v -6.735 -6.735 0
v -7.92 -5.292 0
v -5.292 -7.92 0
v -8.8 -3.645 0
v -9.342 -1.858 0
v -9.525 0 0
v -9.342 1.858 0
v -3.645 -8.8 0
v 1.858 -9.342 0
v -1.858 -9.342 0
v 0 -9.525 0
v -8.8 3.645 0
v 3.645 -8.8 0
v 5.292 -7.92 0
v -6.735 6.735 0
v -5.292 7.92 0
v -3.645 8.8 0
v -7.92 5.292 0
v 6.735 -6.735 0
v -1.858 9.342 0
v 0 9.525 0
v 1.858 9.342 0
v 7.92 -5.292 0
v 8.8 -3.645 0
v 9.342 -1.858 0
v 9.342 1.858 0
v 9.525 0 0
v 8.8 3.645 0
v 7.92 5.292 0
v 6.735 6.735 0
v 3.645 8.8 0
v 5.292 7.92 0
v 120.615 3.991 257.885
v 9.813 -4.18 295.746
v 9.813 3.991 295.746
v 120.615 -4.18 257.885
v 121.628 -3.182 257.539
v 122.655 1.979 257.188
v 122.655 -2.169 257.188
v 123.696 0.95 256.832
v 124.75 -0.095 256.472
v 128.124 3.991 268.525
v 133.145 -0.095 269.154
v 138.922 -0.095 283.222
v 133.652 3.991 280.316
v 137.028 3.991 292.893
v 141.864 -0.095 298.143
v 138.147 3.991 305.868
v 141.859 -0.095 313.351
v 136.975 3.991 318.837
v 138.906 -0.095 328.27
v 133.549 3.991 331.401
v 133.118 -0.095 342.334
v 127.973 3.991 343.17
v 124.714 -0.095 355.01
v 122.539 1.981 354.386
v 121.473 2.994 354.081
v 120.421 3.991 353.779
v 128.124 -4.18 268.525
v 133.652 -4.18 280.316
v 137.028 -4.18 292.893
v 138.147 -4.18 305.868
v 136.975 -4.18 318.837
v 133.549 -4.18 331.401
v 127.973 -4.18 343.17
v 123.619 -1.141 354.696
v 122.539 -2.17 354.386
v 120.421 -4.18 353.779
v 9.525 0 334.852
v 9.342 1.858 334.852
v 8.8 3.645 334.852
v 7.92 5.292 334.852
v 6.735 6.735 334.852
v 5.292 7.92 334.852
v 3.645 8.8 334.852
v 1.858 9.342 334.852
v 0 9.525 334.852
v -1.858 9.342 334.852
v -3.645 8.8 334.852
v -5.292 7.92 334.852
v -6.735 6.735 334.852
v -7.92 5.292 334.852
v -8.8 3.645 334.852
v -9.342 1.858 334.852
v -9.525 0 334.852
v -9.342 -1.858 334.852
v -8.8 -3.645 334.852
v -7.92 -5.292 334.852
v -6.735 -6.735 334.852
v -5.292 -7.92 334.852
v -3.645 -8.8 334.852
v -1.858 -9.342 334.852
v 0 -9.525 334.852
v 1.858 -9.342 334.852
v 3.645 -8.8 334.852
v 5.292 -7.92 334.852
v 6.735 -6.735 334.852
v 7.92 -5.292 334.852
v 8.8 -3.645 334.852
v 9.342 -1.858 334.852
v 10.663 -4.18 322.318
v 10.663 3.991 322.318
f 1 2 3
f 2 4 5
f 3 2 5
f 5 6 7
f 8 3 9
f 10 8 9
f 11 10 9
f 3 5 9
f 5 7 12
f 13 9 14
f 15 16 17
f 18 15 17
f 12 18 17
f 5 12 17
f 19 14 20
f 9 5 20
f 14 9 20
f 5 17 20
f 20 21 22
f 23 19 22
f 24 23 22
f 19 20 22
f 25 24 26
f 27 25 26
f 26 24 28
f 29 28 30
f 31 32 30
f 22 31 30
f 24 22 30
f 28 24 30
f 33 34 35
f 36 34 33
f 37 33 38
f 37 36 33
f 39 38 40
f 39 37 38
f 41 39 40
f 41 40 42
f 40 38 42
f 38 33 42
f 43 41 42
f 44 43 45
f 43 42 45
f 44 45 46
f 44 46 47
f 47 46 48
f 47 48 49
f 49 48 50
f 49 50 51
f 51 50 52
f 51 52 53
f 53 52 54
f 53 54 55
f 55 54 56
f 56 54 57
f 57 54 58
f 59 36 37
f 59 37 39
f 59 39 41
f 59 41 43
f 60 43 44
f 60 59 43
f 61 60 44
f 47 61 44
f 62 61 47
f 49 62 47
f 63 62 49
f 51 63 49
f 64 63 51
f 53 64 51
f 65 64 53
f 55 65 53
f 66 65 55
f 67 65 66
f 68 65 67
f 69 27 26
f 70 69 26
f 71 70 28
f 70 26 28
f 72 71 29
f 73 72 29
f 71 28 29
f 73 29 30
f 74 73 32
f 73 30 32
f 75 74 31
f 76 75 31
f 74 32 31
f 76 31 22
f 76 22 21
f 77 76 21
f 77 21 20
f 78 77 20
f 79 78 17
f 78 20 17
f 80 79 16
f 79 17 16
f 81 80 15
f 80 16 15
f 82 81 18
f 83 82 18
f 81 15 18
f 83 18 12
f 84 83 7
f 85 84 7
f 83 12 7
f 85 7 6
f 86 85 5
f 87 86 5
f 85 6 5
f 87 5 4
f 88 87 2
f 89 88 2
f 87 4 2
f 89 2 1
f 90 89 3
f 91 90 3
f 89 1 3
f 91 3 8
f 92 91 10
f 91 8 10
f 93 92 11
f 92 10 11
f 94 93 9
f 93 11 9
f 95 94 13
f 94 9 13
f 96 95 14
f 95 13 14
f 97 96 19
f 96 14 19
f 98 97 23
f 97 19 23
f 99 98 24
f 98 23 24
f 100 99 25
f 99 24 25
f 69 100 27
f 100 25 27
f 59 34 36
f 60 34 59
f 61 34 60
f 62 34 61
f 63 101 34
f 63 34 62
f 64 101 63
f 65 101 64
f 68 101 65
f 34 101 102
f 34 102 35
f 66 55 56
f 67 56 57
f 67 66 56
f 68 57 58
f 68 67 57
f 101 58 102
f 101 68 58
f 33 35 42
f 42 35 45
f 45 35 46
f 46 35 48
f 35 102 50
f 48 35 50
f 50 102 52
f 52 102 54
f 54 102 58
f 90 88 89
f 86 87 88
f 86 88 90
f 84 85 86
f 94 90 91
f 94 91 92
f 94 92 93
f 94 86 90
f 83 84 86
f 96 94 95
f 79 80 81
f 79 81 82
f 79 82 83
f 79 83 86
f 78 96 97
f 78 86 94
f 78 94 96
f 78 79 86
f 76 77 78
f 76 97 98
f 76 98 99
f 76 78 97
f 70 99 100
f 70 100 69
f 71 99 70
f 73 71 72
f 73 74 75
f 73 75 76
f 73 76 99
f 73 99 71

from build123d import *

# Parameters (mm, degrees)
F0_R          = 9.525
F1_DEPTH      = 334.85178
F3_DEPTH      = 4.18014
F3_DEPTH_BACK = 3.99072
F4_T2_ANGLE   = 96.5800048024
F4_T4_ANGLE   = 96.5800048024


# Not quite as in the source:
# - a fillet or chamfer that OpenCascade refuses, or shapes differently, is made with other operations: its cross-section is extruded or revolved along the edge and cut away or added


with BuildPart() as f1:
    # F0 (on Top) → F1 (new body)
    with BuildSketch(Plane.XY):
        Circle(F0_R)
    extrude(amount=F1_DEPTH)


with BuildPart() as f3:
    # F2 (on Front) → F3 (new body, two sides)
    with BuildSketch(Plane.XZ) as f3_sk:
        with BuildLine():
            Line((125.7524490356, 355.3073406219), (10.6634572148, 322.3180174828))
            Line((10.6634572148, 322.3180174828), (9.8127294332, 295.7464158535))
            Line((9.8127294332, 295.7464158535), (125.7524490356, 256.1295628548))
            ThreePointArc((125.7524490356, 256.1295628548), (143.2271122484, 305.7184517384), (125.7524490356, 355.3073406219))
        make_face()
    extrude(amount=F3_DEPTH)
    extrude(f3_sk.sketch, amount=-F3_DEPTH_BACK)

    # F4: chamfer of 5.08 on 2 edges, made by hand

    # F4_s1 → F4_t2 (revolve, cut)
    with BuildSketch(Plane(origin=(187.5911639165, 0, 167.1963566243), x_dir=(0, 1, 0), z_dir=(-0.7465220942, 0, -0.6653606262))):
        Polygon((0.89986, -106.4585931816), (-4.18014, -111.5385931816), (-4.18014, -106.4585931816), align=None)
    revolve(axis=Axis((64.129114151, -4.18014, 305.7184517384), (0, -1, 0)), revolution_arc=F4_T2_ANGLE, mode=Mode.SUBTRACT)

    # F4_s3 → F4_t4 (revolve, cut)
    with BuildSketch(Plane(origin=(187.5911639165, 0, 167.1963566243), x_dir=(0, 1, 0), z_dir=(-0.7465220942, 0, -0.6653606262))):
        Polygon((-1.08928, -106.4585931816), (3.99072, -111.5385931816), (3.99072, -106.4585931816), align=None)
    revolve(axis=Axis((64.129114151, 3.99072, 305.7184517384), (0, -1, 0)), revolution_arc=F4_T4_ANGLE, mode=Mode.SUBTRACT)


solid = Compound([f1.part, f3.part])
